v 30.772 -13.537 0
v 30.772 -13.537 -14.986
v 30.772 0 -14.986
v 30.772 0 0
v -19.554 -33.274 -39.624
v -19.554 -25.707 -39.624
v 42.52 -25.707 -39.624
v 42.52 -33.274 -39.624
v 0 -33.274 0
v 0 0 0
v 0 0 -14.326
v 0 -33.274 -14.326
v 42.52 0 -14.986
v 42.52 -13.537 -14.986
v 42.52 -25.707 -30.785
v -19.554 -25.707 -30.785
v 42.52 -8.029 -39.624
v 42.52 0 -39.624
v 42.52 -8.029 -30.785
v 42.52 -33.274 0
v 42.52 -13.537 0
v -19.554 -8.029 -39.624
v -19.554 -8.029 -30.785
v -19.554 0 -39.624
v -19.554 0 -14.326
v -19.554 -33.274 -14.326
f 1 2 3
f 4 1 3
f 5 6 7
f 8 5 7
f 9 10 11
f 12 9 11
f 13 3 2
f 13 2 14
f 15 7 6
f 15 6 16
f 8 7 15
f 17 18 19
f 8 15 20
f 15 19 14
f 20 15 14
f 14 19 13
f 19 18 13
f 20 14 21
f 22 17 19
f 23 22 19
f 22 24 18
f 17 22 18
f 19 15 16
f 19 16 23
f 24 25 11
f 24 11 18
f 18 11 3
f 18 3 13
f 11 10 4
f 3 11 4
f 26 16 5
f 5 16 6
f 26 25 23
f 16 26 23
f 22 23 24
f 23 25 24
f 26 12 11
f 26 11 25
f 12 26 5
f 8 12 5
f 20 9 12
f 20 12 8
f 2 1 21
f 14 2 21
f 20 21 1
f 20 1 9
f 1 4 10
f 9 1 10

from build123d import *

# Parameters (mm, degrees)
F1_DEPTH = 33.274
F2_W     = 11.7478076556
F2_H     = 13.536944912
F3_DEPTH = 14.986
F4_W     = 17.6784005016
F4_H     = 8.8392011821
F5_DEPTH = 84.836


with BuildPart() as f1:
    # F0 (on Front) → F1 (new body)
    with BuildSketch(Plane.XZ):
        Polygon((42.5196029246, 0), (0, 0), (0, -14.3256001174), (-19.5541083813, -14.3256001174), (-19.5541083813, -39.6240018308), (42.5196029246, -39.6240018308), align=None)
    extrude(amount=F1_DEPTH)

    # F2 (on face) → F3 (cut)
    with BuildSketch(Plane.XY):
        with Locations((36.6456990968, -6.768472456)):
            Rectangle(F2_W, F2_H)
    extrude(amount=-F3_DEPTH, mode=Mode.SUBTRACT)

    # F4 (on face) → F5 (cut)
    with BuildSketch(Plane.YZ.offset(42.5196029246)):
        with Locations((-16.8679049239, -35.2044012398)):
            Rectangle(F4_W, F4_H)
    extrude(amount=-F5_DEPTH, mode=Mode.SUBTRACT)


solid = f1.part
